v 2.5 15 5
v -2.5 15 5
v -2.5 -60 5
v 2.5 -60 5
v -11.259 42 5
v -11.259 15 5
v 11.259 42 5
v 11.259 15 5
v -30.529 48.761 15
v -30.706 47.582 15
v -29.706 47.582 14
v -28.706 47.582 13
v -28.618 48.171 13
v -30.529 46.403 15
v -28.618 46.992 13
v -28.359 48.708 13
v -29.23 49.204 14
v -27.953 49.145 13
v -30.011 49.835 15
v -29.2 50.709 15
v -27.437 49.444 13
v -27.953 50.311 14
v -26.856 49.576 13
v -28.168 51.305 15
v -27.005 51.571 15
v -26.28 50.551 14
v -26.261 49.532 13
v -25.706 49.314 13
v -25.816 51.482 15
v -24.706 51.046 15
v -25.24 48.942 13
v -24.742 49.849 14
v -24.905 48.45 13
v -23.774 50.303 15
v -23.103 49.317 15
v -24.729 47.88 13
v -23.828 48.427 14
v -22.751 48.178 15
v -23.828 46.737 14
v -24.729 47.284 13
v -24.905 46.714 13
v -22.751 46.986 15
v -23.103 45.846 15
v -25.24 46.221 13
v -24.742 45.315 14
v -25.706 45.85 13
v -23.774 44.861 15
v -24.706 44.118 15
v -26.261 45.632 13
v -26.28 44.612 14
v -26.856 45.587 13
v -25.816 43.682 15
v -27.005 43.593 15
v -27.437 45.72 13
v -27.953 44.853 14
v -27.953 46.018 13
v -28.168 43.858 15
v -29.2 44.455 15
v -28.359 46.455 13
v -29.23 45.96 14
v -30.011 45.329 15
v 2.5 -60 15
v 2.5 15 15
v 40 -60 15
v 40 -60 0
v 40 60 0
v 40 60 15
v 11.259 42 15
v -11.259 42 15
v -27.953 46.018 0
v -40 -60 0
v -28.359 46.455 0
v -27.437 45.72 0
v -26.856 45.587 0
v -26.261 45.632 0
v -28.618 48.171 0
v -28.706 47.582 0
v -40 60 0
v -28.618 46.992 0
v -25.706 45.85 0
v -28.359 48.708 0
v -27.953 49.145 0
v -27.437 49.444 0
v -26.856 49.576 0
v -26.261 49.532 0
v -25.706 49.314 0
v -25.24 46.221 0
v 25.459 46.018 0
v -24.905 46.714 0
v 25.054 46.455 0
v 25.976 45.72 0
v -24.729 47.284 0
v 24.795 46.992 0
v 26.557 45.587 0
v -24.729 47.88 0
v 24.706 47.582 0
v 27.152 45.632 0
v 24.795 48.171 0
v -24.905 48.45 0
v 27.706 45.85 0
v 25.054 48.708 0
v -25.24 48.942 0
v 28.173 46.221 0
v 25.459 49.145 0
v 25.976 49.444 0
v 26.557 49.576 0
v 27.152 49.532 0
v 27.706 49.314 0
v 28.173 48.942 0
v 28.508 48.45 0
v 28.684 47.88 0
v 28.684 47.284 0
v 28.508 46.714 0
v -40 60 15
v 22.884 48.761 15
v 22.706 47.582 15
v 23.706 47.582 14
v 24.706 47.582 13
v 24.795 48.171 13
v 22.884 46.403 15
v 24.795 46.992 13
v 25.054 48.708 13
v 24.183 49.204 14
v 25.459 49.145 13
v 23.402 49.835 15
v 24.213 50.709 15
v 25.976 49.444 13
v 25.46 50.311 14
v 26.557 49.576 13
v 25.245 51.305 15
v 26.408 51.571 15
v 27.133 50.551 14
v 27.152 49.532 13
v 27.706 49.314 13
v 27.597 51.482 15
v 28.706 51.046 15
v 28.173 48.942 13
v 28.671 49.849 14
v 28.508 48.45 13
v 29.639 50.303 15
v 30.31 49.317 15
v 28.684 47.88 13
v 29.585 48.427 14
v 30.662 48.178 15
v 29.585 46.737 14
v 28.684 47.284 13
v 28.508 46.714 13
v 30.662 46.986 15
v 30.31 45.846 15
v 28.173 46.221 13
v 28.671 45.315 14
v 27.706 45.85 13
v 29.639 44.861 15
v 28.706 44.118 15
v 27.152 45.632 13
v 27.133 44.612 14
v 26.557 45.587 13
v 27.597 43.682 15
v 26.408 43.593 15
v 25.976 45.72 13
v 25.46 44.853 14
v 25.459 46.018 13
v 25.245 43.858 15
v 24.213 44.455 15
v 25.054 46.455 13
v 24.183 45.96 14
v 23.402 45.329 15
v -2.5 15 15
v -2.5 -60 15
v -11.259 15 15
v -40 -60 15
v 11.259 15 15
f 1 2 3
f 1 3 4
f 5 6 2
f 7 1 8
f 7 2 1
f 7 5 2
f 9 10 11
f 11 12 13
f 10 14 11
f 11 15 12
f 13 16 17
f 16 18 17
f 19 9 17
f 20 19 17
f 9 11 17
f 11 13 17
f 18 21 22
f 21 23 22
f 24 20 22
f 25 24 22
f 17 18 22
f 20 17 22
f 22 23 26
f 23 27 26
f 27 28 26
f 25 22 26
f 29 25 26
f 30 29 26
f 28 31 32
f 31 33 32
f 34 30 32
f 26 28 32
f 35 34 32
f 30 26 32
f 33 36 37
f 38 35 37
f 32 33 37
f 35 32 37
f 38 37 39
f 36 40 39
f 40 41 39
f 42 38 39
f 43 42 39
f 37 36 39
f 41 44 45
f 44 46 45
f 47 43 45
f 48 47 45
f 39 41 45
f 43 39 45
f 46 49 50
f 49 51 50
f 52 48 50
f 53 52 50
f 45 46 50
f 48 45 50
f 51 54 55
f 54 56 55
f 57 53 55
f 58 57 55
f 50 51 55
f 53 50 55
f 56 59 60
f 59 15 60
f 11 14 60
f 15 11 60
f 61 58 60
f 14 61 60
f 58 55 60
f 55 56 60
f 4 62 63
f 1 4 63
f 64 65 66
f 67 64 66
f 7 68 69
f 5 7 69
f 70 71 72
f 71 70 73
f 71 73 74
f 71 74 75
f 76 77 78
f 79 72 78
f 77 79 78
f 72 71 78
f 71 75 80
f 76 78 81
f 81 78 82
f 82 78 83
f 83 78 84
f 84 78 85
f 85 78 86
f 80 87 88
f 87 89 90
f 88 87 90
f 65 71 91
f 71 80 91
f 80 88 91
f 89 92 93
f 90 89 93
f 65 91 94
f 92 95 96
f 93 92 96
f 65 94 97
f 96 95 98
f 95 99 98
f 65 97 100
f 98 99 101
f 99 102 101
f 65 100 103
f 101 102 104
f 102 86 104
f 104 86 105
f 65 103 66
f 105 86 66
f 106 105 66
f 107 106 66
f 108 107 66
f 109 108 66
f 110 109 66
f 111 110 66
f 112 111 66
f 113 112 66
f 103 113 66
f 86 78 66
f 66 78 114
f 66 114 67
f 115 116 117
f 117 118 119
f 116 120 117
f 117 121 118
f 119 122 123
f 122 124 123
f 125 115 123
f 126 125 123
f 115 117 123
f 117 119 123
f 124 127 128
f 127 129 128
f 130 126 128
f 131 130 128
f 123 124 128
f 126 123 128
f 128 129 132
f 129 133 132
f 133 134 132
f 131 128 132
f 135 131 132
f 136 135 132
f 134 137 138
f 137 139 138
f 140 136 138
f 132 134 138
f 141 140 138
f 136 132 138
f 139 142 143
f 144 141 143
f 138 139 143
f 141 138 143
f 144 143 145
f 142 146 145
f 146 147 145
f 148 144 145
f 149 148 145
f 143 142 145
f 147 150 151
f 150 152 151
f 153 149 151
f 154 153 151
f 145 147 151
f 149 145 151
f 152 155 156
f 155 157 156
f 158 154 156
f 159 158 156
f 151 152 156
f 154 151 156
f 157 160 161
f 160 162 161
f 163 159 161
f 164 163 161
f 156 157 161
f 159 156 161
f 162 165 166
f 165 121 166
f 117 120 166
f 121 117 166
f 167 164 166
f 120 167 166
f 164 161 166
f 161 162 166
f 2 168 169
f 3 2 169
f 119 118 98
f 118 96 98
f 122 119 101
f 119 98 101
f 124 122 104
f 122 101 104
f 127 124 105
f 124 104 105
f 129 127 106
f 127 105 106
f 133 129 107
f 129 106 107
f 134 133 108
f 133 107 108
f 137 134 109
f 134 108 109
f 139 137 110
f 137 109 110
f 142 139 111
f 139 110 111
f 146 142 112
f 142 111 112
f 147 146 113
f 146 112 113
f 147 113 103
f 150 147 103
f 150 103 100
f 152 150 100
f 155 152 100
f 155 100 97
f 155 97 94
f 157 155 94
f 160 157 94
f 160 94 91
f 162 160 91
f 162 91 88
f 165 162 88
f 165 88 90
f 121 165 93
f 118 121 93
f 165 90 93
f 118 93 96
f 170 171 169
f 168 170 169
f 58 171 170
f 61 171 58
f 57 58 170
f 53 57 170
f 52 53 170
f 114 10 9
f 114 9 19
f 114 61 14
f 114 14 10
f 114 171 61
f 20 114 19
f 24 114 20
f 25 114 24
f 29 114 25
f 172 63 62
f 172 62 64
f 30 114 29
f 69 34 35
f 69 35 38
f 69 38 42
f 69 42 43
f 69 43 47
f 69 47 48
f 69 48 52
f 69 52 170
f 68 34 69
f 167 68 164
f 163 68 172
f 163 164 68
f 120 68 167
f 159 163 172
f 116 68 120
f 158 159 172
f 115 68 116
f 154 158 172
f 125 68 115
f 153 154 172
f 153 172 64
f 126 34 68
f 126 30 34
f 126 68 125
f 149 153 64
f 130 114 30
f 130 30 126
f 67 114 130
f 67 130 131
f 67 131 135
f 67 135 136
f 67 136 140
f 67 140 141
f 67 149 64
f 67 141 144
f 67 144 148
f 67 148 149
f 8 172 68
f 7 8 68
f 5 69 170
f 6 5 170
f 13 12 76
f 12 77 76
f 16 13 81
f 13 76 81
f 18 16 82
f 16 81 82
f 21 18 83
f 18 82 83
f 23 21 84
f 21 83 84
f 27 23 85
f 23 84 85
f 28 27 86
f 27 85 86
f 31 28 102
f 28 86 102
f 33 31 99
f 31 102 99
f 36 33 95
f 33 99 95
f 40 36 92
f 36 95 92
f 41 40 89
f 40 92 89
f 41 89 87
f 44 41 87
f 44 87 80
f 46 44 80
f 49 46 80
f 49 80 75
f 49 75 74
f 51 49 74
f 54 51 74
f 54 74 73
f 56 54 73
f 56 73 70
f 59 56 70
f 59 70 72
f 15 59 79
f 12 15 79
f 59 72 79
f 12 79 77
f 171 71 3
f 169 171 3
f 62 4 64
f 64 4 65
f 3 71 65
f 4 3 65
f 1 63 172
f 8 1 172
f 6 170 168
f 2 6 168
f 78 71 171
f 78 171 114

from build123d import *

# Parameters (mm, degrees)
F0_W           = 80
F0_H           = 120
F1_DEPTH       = 15
F3_DEPTH       = 10
F5_D           = 4
F5_CSINK_D     = 8
F5_CSINK_ANGLE = 90


with BuildPart() as f1:
    # F0 (on Top) → F1 (new body)
    with BuildSketch(Plane.XY):
        Rectangle(F0_W, F0_H)
    extrude(amount=F1_DEPTH)

    # F2 (on face) → F3 (cut)
    with BuildSketch(Plane.XY.offset(15)):
        Polygon((-11.2589411438, 15), (-2.5, 15), (-2.5, -60), (0, -60), (2.5, -60), (2.5, 15), (11.2589411438, 15), (11.2589411438, 42), (-11.2589411438, 42), align=None)
    extrude(amount=-F3_DEPTH, mode=Mode.SUBTRACT)

    # F5 (through all)
    with Locations(Plane.XY.offset(15)):
        with Locations((-26.7064720392, 47.5818291306), (26.7064720392, 47.5818291306)):
            CounterSinkHole(F5_D / 2, F5_CSINK_D / 2, counter_sink_angle=F5_CSINK_ANGLE)


solid = f1.part
